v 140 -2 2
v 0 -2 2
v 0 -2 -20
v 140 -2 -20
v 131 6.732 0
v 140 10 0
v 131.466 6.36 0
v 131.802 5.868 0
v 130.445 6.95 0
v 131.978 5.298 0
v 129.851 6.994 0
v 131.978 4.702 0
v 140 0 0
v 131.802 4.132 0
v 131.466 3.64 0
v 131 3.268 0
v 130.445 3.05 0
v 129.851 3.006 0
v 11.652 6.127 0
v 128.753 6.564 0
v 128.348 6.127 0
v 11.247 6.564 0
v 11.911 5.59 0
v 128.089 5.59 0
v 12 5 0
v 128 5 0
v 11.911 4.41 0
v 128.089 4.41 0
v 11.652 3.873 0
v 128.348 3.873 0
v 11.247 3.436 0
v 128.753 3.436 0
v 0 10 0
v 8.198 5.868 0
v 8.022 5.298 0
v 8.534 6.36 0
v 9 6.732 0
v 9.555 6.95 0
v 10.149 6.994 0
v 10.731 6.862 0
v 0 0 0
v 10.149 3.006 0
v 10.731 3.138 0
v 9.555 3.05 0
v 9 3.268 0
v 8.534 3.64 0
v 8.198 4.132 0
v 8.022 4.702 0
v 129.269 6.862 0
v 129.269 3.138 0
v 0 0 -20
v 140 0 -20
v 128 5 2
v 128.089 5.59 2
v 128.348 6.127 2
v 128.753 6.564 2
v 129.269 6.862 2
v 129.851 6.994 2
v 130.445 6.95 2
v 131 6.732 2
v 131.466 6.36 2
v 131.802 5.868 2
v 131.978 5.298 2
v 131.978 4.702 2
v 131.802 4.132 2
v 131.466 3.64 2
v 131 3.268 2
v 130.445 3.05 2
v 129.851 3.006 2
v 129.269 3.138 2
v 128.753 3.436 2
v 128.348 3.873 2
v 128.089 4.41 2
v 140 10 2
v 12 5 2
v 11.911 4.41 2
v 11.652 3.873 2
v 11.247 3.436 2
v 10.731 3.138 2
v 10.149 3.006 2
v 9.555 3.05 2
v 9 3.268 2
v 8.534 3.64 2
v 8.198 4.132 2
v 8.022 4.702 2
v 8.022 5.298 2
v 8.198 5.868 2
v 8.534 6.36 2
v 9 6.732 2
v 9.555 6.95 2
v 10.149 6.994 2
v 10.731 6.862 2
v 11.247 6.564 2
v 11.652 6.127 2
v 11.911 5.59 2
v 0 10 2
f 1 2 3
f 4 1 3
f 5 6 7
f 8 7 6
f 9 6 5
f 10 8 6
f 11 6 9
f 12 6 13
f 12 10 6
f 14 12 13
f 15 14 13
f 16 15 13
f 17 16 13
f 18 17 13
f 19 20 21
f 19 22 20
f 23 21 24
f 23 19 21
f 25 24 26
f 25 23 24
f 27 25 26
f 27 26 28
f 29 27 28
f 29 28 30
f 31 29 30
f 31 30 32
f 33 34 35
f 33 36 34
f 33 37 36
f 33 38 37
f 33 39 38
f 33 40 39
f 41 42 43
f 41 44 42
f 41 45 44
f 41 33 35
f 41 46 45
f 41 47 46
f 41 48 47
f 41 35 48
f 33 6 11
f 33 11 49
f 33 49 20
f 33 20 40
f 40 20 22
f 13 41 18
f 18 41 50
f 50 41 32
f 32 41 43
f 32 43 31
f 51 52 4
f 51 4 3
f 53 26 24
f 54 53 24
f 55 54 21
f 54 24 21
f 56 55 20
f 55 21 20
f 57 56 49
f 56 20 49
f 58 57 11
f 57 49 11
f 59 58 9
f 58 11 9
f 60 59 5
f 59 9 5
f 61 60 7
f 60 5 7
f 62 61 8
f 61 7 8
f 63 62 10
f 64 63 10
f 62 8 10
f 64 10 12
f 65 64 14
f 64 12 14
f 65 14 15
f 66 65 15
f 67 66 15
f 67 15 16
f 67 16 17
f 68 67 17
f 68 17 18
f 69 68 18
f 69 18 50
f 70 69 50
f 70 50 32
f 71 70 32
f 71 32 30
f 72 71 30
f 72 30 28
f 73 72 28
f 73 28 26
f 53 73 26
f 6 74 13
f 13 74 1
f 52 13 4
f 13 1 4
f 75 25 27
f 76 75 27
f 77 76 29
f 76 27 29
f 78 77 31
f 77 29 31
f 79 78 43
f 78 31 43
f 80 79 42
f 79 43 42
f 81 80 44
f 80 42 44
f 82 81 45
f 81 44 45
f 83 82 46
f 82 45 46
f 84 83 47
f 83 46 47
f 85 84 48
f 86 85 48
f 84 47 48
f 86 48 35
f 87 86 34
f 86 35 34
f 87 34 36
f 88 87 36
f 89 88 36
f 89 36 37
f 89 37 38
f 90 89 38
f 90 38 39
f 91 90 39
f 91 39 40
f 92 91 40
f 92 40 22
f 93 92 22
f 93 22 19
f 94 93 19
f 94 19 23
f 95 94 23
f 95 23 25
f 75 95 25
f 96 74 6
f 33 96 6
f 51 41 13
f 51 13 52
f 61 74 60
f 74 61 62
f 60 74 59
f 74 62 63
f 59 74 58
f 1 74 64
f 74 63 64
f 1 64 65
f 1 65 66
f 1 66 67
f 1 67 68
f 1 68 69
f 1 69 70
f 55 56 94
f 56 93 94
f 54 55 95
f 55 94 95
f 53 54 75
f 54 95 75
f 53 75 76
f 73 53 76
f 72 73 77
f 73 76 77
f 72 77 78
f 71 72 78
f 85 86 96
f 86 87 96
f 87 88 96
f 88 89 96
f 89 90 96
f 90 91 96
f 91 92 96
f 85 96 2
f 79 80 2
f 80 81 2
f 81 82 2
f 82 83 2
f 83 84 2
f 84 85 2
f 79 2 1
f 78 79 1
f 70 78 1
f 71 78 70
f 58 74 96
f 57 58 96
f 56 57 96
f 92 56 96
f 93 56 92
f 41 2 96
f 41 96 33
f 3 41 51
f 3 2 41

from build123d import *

# Parameters (mm, degrees)
SURFACE_EXTRUDE1_1_DEPTH = 140
THICKEN1_T2              = 2
SKETCH2_R                = 2
CUT_EXTRUDE2_DEPTH       = 142.774468788


with BuildPart() as body_1:
    # Surface-Extrude1: a surface, the sketch's curves swept straight by 140 mm
    with BuildLine(Plane(origin=(0, 0, 0), x_dir=(0, 0, -1), z_dir=(1, 0, 0)), mode=Mode.PRIVATE) as surface_extrude1_1_path:
        Line((0, 10), (0, 0))
        Line((0, 0), (20, 0))
    surface_extrude1_1 = Shell.extrude(surface_extrude1_1_path.wire(), (1 * SURFACE_EXTRUDE1_1_DEPTH, 0 * SURFACE_EXTRUDE1_1_DEPTH, 0 * SURFACE_EXTRUDE1_1_DEPTH))
    add(Solid.thicken(surface_extrude1_1, -THICKEN1_T2))

    # Sketch2 → Cut-Extrude2 (cut, through all)
    with BuildSketch(Plane(origin=(0, 0, 0), x_dir=(-1, 0, 0), z_dir=(0, 0, -1))):
        with Locations((-130, 5)):
            Circle(SKETCH2_R)
        with Locations(Location((-10, 5, 0), (0, 0, 180))):
            Circle(SKETCH2_R)
    extrude(amount=-CUT_EXTRUDE2_DEPTH, mode=Mode.SUBTRACT)


solid = body_1.part
